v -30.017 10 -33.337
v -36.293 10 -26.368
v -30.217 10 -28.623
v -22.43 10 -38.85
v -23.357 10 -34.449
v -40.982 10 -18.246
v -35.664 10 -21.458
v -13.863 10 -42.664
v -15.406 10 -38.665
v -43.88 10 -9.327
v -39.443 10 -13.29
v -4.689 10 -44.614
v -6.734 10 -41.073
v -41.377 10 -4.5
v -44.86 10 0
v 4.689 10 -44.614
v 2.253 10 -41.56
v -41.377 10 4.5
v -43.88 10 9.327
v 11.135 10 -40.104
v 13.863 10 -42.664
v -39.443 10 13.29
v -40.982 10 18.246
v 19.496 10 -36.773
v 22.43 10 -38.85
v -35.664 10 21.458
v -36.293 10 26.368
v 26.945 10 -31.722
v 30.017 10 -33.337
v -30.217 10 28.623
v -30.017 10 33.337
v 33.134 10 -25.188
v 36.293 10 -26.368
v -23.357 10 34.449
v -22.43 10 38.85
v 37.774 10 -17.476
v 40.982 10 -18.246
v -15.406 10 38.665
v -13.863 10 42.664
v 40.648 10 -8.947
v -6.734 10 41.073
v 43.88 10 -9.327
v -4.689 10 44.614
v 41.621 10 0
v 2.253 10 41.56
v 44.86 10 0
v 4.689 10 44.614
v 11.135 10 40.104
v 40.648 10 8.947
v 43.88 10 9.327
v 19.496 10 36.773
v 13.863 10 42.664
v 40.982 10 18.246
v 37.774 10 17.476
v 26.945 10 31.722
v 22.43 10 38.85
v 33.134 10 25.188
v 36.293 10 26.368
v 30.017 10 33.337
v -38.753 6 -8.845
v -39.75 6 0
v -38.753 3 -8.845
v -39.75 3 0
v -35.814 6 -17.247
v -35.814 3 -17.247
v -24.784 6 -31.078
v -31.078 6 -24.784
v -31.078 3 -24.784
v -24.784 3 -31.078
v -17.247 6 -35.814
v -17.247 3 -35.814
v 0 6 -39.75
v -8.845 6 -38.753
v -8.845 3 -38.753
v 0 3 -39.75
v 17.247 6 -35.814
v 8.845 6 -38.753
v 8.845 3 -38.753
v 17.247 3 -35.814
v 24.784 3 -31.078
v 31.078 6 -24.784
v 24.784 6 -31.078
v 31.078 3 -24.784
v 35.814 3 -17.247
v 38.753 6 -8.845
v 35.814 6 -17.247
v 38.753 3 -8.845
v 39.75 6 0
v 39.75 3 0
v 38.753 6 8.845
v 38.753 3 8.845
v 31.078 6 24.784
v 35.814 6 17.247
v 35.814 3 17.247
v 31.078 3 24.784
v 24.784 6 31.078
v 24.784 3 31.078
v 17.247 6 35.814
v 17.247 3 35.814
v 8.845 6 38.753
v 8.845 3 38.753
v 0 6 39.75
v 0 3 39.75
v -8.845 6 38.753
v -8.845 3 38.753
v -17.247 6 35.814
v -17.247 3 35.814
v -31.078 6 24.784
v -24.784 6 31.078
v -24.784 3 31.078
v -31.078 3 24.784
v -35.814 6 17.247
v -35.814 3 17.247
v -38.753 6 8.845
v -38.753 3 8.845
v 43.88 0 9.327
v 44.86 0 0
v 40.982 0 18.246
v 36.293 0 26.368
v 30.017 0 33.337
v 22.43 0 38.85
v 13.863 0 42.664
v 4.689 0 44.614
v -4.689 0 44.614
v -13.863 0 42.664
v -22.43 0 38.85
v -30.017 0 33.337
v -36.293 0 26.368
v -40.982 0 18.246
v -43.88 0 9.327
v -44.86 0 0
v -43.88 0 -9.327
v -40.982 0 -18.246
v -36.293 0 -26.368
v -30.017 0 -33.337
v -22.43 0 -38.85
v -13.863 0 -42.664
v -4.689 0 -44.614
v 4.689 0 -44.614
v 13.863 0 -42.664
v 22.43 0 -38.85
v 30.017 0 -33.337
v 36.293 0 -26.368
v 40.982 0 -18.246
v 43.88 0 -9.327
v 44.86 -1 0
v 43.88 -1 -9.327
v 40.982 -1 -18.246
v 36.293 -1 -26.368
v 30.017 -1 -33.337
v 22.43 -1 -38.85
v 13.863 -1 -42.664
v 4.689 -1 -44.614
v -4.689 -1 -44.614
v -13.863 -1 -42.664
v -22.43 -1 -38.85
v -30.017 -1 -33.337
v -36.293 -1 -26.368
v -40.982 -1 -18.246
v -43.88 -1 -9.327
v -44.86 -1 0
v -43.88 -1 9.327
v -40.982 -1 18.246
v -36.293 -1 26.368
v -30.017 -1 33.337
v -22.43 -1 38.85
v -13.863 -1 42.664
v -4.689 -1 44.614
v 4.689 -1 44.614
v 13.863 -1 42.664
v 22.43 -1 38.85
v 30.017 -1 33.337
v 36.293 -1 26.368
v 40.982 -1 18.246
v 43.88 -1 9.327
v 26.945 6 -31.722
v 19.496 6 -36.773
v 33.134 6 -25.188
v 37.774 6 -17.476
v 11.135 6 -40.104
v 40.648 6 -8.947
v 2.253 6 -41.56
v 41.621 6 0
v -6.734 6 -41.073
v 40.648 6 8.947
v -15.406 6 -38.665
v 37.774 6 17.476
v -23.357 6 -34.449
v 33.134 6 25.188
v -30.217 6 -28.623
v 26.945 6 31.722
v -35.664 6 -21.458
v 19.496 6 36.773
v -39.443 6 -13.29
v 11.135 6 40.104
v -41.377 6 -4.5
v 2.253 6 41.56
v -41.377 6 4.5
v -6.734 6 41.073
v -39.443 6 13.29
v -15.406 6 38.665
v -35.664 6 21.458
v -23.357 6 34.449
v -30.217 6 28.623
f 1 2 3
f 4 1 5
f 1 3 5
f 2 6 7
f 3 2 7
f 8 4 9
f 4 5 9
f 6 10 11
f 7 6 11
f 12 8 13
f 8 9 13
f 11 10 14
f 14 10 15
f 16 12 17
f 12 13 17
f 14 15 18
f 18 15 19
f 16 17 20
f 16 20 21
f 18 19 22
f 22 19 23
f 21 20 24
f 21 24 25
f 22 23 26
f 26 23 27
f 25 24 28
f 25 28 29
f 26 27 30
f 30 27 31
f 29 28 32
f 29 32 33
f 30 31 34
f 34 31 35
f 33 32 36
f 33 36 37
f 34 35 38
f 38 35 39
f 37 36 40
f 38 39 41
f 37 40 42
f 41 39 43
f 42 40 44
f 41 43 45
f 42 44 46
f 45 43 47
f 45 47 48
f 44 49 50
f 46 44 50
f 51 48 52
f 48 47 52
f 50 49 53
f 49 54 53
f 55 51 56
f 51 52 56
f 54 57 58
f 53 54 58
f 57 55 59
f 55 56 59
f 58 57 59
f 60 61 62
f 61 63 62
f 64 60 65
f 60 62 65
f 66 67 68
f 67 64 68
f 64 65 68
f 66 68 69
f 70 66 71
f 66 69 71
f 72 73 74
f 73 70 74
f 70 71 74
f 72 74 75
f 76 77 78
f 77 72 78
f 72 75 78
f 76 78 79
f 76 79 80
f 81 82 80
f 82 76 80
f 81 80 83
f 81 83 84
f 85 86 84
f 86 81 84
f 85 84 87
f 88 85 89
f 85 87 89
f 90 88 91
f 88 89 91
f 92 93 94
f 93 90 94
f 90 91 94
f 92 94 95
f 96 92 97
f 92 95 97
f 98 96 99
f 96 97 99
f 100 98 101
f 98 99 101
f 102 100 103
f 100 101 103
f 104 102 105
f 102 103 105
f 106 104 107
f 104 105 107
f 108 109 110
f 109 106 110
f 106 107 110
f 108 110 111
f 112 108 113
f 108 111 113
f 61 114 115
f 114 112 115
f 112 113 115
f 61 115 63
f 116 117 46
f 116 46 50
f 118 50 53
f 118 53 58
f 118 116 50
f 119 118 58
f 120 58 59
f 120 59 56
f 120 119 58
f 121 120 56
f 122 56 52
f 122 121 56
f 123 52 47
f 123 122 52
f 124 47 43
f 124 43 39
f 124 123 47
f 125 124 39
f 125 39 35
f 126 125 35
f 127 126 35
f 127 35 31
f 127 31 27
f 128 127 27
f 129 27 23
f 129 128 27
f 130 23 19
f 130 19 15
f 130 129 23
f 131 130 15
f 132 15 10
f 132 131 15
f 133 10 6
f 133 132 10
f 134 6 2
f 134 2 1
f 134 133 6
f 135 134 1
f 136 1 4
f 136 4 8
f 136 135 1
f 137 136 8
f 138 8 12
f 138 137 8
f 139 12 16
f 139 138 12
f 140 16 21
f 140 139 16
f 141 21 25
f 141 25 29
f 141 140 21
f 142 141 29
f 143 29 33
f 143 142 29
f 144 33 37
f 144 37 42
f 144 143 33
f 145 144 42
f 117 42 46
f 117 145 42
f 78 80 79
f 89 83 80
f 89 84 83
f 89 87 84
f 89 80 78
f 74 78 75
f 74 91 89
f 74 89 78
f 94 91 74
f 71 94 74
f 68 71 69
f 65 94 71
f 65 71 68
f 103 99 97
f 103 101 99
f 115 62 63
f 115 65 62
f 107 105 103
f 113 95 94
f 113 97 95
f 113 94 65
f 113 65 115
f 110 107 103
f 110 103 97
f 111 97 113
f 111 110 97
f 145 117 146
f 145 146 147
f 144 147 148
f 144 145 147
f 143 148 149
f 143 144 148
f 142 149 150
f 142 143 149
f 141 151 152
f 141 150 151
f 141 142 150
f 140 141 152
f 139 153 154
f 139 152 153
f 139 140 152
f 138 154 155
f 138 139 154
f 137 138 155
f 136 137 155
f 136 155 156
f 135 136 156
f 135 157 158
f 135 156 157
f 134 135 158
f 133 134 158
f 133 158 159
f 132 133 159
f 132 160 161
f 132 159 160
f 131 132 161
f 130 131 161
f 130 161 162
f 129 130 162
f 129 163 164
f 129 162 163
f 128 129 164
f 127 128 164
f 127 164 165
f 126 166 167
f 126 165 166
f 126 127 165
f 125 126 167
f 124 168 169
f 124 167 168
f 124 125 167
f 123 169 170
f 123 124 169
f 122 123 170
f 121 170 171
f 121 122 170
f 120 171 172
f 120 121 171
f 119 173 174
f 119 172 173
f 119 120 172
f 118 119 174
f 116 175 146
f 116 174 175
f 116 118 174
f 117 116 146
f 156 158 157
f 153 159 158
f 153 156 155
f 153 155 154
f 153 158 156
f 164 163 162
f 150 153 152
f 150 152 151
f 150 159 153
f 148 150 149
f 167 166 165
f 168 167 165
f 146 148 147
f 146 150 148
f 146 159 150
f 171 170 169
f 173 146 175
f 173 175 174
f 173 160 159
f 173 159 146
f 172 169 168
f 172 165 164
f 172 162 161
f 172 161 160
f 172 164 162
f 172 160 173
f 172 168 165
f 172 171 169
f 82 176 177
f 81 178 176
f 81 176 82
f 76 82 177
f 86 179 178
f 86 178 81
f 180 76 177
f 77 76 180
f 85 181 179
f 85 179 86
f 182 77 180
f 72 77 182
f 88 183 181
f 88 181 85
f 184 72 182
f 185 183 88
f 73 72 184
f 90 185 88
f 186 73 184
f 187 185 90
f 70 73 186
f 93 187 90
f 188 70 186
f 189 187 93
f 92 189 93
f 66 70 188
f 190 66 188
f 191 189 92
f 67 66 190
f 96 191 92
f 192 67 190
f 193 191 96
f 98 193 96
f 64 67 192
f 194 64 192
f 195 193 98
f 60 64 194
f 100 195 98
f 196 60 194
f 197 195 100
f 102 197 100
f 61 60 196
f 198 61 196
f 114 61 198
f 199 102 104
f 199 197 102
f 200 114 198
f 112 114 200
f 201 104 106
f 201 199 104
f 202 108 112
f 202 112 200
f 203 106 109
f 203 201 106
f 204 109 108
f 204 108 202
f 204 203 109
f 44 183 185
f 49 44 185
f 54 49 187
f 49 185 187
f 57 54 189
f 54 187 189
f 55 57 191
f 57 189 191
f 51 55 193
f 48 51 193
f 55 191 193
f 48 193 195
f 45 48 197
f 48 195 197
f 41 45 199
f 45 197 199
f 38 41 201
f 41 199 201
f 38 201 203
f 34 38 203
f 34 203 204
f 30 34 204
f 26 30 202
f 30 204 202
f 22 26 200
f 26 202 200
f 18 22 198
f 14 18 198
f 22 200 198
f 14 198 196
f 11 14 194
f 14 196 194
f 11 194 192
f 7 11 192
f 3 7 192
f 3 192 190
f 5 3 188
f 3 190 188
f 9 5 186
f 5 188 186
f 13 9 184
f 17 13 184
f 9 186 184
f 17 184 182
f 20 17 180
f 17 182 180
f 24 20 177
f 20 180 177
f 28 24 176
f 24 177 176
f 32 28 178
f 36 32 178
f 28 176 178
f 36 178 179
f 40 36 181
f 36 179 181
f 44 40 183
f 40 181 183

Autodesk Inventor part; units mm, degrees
ref_plane "YZ Plane" through (0, 0, 0) normal (1, 0, 0) x (0, 1, 0)
ref_plane "XZ Plane" through (0, 0, 0) normal (0, 1, 0) x (-1, 0, 0)
ref_plane "XY Plane" through (0, 0, 0) normal (0, 0, 1) x (1, 0, 0)
sketch "Sketch4" plane through (0, 0, 0) normal (0, 1, 0) x (-1, 0, 0)
  circle A0 centre (0, 0) radius 39.75
  circle A1 centre (0, 0) radius 41.745
  dimension "d17" = 79.5
  dimension "d18" = 83.49
sketch "Sketch6" plane through (0, 0, 0) normal (0, 1, 0) x (-1, 0, 0)
  circle A0 centre (0, 0) radius 39.7618
extrude "Extrusion1" add sketch "Sketch6" along normal blind 3
extrude "Extrusion2" add sketch "Sketch4" along normal blind 6
sketch "Sketch7" plane through (0, 0, 0) normal (0, -1, 0) x (1, 0, 0)
  circle A0 centre (0, 0) radius 44.86
  circle A1 centre (0, 0) radius 41.6213
extrude "Extrusion3" add sketch "Sketch7" against normal blind 10
sketch "Sketch8" plane through (0, 0, 0) normal (0, -1, 0) x (1, 0, 0)
  circle A0 centre (0, 0) radius 44.86
extrude "Extrusion4" add sketch "Sketch8" along normal blind 1
properties part number "Soft Coating Gripper mold"
